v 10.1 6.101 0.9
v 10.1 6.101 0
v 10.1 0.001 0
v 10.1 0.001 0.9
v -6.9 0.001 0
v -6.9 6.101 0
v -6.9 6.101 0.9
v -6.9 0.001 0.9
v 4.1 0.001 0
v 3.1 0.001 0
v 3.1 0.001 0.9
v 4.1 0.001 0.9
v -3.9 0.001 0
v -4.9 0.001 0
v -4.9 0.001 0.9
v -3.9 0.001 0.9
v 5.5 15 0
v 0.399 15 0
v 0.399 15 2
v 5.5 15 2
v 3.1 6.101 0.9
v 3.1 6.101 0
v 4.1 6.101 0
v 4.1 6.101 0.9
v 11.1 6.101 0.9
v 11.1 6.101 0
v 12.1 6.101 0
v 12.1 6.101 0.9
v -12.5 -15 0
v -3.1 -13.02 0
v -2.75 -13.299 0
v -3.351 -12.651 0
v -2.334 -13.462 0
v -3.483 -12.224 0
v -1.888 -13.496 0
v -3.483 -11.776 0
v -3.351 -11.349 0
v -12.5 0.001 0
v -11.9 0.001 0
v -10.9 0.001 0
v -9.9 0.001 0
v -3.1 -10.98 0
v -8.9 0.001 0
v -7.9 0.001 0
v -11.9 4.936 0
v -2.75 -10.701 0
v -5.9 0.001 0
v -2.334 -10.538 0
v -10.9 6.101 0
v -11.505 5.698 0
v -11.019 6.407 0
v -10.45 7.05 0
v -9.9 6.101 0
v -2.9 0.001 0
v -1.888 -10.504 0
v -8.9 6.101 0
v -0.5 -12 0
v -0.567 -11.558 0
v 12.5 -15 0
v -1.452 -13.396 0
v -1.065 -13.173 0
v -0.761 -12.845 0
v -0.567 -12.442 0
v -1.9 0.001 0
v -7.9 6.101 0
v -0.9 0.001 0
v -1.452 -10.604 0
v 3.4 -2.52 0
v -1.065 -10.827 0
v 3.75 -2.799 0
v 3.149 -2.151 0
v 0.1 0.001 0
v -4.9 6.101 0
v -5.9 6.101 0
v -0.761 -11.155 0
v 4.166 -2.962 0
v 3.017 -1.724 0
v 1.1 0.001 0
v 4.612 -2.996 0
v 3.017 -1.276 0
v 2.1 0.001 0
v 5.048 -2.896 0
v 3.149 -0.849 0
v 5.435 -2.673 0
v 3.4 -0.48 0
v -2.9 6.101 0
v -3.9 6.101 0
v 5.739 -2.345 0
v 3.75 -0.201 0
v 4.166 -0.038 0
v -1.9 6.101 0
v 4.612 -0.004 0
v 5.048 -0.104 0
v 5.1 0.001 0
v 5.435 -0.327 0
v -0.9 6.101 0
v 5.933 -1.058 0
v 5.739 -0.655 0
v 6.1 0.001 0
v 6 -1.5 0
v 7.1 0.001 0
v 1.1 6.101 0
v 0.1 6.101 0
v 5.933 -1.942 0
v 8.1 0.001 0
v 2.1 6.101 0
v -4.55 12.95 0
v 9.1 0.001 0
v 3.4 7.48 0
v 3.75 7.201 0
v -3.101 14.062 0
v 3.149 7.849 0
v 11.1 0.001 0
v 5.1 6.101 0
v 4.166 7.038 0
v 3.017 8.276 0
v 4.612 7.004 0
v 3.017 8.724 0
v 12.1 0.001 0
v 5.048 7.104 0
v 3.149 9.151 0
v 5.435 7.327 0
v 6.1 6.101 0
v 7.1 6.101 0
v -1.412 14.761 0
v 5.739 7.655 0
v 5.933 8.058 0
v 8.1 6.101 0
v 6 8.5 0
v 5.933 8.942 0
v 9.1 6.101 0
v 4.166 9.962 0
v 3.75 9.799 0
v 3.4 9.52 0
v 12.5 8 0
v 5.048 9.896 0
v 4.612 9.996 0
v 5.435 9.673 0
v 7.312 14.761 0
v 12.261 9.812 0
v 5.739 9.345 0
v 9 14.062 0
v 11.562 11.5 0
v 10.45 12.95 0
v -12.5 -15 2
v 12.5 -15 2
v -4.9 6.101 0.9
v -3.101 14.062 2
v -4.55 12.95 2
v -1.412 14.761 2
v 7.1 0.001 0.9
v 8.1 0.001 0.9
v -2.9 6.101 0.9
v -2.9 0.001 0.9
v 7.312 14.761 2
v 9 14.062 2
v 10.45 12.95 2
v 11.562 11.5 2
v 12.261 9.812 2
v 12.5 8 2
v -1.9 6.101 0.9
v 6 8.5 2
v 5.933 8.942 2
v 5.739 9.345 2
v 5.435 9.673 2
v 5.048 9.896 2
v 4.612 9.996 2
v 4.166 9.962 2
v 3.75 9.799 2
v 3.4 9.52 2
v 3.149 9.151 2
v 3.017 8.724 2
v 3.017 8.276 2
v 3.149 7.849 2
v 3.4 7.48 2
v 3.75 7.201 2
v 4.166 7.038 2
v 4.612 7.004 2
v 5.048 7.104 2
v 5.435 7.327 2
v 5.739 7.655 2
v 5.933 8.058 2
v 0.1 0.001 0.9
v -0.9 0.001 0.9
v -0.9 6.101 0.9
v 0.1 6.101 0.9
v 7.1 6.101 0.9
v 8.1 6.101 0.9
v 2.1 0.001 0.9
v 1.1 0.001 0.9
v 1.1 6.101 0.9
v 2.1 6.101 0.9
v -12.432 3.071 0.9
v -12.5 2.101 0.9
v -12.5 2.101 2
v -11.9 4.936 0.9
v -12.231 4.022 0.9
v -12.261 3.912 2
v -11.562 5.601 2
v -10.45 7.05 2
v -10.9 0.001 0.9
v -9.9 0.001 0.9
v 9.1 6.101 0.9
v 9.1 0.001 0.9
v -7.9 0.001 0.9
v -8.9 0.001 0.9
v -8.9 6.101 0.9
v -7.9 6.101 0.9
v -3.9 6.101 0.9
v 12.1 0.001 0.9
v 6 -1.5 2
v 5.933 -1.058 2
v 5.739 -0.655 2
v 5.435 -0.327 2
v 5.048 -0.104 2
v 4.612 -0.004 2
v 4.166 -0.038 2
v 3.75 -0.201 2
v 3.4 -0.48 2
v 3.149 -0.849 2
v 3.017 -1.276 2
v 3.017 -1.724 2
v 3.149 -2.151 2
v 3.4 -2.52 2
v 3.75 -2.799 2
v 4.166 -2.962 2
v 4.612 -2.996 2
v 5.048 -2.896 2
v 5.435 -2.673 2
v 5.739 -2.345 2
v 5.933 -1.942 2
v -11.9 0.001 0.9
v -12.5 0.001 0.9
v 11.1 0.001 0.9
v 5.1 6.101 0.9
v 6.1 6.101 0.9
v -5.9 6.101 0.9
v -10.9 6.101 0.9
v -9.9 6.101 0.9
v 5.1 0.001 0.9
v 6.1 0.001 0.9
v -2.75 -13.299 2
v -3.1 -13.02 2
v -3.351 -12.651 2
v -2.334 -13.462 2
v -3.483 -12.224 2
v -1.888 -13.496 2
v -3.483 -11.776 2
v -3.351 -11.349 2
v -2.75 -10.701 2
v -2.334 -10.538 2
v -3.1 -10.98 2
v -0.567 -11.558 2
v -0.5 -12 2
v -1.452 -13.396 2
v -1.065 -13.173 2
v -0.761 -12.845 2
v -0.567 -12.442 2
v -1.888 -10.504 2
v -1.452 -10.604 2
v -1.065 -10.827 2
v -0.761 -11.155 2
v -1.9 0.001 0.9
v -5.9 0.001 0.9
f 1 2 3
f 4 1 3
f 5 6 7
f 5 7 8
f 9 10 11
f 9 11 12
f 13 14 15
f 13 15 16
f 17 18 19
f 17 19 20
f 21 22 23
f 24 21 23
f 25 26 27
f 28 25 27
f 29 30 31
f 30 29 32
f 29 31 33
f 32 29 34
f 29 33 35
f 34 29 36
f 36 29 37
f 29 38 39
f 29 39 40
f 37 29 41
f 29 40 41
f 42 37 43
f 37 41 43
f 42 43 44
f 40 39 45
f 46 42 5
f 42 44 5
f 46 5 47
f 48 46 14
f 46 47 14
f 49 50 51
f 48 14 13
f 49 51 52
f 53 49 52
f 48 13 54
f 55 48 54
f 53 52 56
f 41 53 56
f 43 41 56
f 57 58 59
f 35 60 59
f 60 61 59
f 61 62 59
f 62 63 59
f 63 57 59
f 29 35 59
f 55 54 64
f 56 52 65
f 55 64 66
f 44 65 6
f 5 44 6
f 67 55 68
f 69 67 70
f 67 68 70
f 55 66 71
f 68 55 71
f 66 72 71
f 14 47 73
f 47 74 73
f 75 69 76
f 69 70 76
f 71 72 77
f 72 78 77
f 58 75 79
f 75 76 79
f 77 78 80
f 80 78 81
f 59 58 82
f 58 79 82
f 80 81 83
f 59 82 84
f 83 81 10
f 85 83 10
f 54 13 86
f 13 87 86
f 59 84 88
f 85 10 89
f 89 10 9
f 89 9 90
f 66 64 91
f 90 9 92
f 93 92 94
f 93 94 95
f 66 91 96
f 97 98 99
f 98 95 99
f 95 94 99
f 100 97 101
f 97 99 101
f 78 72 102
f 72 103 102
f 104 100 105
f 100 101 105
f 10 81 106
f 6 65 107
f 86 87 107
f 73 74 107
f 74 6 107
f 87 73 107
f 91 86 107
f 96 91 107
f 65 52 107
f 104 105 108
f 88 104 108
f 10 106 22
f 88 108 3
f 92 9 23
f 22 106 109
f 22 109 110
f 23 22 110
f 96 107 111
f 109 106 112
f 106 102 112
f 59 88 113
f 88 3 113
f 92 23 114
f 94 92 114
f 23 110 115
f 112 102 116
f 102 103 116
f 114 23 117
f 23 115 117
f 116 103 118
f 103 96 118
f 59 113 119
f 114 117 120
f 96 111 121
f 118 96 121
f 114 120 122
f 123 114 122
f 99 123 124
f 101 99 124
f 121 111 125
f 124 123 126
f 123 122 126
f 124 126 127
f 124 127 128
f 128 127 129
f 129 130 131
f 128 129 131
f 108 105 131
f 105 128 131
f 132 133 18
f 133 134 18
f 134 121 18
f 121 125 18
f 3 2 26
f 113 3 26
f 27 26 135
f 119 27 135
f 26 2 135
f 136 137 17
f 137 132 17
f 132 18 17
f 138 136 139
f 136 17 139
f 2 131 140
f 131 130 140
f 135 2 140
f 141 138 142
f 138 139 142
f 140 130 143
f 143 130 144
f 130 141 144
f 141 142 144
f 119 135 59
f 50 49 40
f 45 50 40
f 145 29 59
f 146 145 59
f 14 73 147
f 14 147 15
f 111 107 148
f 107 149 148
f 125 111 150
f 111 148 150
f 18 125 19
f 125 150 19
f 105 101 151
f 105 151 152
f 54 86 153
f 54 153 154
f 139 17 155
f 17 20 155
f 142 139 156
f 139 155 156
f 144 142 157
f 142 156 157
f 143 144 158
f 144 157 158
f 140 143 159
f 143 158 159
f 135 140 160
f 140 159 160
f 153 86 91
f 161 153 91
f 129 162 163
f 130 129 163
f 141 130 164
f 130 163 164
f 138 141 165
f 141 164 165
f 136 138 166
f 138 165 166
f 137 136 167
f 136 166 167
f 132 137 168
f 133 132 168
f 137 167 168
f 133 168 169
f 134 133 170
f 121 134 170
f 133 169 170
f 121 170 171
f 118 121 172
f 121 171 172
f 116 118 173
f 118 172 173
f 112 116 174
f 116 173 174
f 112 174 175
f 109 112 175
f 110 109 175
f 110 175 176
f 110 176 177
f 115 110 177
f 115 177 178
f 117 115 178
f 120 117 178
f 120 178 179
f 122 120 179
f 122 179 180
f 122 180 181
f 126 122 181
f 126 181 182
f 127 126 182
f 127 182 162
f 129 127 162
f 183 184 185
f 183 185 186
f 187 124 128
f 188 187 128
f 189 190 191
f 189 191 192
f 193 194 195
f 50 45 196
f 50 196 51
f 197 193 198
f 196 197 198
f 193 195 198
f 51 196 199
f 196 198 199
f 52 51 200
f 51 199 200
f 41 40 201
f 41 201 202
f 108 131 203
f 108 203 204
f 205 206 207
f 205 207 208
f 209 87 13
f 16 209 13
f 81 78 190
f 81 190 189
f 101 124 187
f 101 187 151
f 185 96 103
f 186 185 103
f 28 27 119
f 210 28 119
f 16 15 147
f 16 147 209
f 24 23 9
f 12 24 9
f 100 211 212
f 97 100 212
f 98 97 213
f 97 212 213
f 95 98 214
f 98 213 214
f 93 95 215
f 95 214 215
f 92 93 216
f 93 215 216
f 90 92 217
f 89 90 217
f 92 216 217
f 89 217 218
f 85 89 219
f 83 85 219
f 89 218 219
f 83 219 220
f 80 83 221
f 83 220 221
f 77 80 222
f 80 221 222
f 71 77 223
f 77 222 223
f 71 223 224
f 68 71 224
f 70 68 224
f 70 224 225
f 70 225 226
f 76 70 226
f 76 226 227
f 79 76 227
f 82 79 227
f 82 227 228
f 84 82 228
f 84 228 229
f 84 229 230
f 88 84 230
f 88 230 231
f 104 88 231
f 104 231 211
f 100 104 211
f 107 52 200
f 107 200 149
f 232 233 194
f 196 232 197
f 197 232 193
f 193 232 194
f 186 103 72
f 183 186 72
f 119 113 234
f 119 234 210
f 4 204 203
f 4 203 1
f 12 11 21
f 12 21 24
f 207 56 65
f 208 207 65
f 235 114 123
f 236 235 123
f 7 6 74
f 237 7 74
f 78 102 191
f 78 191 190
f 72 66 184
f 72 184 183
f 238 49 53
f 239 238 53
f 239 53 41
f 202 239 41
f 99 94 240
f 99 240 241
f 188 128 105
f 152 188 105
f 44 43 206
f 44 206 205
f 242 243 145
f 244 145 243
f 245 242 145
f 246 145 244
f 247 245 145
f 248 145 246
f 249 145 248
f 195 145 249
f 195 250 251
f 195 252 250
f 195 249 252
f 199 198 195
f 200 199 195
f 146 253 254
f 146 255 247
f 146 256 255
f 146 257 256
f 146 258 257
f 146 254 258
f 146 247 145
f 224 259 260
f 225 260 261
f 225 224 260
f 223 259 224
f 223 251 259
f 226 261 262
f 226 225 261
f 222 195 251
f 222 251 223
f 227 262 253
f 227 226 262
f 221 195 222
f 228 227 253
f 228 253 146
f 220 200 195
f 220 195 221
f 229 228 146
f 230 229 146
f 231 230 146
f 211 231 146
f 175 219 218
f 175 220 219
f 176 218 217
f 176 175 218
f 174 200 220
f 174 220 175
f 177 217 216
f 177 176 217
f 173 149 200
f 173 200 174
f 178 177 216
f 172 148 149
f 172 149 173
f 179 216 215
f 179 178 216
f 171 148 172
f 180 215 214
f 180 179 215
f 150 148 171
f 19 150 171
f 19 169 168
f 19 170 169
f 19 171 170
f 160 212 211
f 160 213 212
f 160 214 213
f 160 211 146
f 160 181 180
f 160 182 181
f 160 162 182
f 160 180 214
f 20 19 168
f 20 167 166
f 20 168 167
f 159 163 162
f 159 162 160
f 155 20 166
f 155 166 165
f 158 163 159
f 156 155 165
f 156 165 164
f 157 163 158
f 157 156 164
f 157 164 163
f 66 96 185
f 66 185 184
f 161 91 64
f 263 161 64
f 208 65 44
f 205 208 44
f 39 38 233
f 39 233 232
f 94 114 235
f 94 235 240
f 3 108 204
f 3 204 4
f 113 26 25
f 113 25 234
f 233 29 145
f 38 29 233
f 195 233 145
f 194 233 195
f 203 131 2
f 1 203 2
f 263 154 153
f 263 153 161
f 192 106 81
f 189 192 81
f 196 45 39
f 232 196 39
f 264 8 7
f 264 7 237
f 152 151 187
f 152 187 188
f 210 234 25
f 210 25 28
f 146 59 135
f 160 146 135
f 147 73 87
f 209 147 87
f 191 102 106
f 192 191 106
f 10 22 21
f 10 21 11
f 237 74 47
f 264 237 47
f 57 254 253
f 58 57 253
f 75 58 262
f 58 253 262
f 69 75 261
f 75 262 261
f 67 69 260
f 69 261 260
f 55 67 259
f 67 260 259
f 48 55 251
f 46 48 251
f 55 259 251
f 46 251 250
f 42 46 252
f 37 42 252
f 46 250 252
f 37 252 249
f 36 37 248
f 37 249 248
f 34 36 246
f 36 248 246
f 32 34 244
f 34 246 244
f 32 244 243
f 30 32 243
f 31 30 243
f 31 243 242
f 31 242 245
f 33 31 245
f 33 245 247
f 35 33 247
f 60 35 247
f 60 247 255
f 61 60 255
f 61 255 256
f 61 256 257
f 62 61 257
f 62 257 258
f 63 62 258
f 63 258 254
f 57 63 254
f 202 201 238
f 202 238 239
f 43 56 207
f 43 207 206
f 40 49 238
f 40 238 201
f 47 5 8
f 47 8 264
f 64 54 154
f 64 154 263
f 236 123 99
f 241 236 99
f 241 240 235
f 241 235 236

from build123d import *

# Parameters (mm, degrees)
F0_W        = 25
F0_H        = 30
F1_DEPTH    = 2
F2_R        = 1.5
F3_DEPTH    = 2.001
F4_W        = 1
F4_H        = 6.1
F5_DEPTH    = 0.9
F6_T1_DEPTH = 53.4336597593
F7_R        = 7


# Not quite as in the source:
# - a fillet or chamfer that OpenCascade refuses, or shapes differently, is made with other operations: its cross-section is extruded or revolved along the edge and cut away or added


with BuildPart() as f1:
    # F0 (on Top) → F1 (new body)
    with BuildSketch(Plane.XY):
        Rectangle(F0_W, F0_H)
    extrude(amount=F1_DEPTH)

    # F2 (on face) → F3 (cut, through all)
    with BuildSketch(Plane.XY.offset(2)):
        with Locations((-2, -12)):
            Circle(F2_R)
        with Locations((4.5, -1.5)):
            Circle(F2_R)
        with Locations((4.5, 8.5)):
            Circle(F2_R)
    extrude(amount=-F3_DEPTH, mode=Mode.SUBTRACT)

    # F4 (on face) → F5 (cut)
    with BuildSketch(Plane(origin=(0, 0, 0), x_dir=(1, 0, 0), z_dir=(0, 0, -1))):
        with Locations((11.6, -3.051)):
            Rectangle(F4_W, F4_H)
        with Locations((9.6, -3.051)):
            Rectangle(F4_W, F4_H)
        with Locations((7.6, -3.051)):
            Rectangle(F4_W, F4_H)
        with Locations((5.6, -3.051)):
            Rectangle(F4_W, F4_H)
        with Locations((3.6, -3.051)):
            Rectangle(F4_W, F4_H)
        with Locations((1.6, -3.051)):
            Rectangle(F4_W, F4_H)
        with Locations((-0.4, -3.051)):
            Rectangle(F4_W, F4_H)
        with Locations((-2.4, -3.051)):
            Rectangle(F4_W, F4_H)
        with Locations((-4.4, -3.051)):
            Rectangle(F4_W, F4_H)
        with Locations((-6.4, -3.051)):
            Rectangle(F4_W, F4_H)
        with Locations((-8.4, -3.051)):
            Rectangle(F4_W, F4_H)
        with Locations((-10.4, -3.051)):
            Rectangle(F4_W, F4_H)
        with Locations((-12.4, -3.051)):
            Rectangle(F4_W, F4_H)
    extrude(amount=-F5_DEPTH, mode=Mode.SUBTRACT)

    # F6: chamfer of 10 on 1 edges, made by hand

    # F6_s2 → F6_t1 (cut)
    with BuildSketch(Plane.XY.offset(-25.7168298797)):
        Polygon((-12.5, 5), (-2.5, 15), (-12.5, 15), align=None)
    extrude(amount=F6_T1_DEPTH, mode=Mode.SUBTRACT)

    # F7
    f7_edges = [f1.edges().sort_by_distance(p)[0] for p in [
        (-12.5, 5, 1.45),
        (-2.5, 15, 1),
        (12.5, 15, 1),
    ]]
    fillet(f7_edges, radius=F7_R)


solid = f1.part
